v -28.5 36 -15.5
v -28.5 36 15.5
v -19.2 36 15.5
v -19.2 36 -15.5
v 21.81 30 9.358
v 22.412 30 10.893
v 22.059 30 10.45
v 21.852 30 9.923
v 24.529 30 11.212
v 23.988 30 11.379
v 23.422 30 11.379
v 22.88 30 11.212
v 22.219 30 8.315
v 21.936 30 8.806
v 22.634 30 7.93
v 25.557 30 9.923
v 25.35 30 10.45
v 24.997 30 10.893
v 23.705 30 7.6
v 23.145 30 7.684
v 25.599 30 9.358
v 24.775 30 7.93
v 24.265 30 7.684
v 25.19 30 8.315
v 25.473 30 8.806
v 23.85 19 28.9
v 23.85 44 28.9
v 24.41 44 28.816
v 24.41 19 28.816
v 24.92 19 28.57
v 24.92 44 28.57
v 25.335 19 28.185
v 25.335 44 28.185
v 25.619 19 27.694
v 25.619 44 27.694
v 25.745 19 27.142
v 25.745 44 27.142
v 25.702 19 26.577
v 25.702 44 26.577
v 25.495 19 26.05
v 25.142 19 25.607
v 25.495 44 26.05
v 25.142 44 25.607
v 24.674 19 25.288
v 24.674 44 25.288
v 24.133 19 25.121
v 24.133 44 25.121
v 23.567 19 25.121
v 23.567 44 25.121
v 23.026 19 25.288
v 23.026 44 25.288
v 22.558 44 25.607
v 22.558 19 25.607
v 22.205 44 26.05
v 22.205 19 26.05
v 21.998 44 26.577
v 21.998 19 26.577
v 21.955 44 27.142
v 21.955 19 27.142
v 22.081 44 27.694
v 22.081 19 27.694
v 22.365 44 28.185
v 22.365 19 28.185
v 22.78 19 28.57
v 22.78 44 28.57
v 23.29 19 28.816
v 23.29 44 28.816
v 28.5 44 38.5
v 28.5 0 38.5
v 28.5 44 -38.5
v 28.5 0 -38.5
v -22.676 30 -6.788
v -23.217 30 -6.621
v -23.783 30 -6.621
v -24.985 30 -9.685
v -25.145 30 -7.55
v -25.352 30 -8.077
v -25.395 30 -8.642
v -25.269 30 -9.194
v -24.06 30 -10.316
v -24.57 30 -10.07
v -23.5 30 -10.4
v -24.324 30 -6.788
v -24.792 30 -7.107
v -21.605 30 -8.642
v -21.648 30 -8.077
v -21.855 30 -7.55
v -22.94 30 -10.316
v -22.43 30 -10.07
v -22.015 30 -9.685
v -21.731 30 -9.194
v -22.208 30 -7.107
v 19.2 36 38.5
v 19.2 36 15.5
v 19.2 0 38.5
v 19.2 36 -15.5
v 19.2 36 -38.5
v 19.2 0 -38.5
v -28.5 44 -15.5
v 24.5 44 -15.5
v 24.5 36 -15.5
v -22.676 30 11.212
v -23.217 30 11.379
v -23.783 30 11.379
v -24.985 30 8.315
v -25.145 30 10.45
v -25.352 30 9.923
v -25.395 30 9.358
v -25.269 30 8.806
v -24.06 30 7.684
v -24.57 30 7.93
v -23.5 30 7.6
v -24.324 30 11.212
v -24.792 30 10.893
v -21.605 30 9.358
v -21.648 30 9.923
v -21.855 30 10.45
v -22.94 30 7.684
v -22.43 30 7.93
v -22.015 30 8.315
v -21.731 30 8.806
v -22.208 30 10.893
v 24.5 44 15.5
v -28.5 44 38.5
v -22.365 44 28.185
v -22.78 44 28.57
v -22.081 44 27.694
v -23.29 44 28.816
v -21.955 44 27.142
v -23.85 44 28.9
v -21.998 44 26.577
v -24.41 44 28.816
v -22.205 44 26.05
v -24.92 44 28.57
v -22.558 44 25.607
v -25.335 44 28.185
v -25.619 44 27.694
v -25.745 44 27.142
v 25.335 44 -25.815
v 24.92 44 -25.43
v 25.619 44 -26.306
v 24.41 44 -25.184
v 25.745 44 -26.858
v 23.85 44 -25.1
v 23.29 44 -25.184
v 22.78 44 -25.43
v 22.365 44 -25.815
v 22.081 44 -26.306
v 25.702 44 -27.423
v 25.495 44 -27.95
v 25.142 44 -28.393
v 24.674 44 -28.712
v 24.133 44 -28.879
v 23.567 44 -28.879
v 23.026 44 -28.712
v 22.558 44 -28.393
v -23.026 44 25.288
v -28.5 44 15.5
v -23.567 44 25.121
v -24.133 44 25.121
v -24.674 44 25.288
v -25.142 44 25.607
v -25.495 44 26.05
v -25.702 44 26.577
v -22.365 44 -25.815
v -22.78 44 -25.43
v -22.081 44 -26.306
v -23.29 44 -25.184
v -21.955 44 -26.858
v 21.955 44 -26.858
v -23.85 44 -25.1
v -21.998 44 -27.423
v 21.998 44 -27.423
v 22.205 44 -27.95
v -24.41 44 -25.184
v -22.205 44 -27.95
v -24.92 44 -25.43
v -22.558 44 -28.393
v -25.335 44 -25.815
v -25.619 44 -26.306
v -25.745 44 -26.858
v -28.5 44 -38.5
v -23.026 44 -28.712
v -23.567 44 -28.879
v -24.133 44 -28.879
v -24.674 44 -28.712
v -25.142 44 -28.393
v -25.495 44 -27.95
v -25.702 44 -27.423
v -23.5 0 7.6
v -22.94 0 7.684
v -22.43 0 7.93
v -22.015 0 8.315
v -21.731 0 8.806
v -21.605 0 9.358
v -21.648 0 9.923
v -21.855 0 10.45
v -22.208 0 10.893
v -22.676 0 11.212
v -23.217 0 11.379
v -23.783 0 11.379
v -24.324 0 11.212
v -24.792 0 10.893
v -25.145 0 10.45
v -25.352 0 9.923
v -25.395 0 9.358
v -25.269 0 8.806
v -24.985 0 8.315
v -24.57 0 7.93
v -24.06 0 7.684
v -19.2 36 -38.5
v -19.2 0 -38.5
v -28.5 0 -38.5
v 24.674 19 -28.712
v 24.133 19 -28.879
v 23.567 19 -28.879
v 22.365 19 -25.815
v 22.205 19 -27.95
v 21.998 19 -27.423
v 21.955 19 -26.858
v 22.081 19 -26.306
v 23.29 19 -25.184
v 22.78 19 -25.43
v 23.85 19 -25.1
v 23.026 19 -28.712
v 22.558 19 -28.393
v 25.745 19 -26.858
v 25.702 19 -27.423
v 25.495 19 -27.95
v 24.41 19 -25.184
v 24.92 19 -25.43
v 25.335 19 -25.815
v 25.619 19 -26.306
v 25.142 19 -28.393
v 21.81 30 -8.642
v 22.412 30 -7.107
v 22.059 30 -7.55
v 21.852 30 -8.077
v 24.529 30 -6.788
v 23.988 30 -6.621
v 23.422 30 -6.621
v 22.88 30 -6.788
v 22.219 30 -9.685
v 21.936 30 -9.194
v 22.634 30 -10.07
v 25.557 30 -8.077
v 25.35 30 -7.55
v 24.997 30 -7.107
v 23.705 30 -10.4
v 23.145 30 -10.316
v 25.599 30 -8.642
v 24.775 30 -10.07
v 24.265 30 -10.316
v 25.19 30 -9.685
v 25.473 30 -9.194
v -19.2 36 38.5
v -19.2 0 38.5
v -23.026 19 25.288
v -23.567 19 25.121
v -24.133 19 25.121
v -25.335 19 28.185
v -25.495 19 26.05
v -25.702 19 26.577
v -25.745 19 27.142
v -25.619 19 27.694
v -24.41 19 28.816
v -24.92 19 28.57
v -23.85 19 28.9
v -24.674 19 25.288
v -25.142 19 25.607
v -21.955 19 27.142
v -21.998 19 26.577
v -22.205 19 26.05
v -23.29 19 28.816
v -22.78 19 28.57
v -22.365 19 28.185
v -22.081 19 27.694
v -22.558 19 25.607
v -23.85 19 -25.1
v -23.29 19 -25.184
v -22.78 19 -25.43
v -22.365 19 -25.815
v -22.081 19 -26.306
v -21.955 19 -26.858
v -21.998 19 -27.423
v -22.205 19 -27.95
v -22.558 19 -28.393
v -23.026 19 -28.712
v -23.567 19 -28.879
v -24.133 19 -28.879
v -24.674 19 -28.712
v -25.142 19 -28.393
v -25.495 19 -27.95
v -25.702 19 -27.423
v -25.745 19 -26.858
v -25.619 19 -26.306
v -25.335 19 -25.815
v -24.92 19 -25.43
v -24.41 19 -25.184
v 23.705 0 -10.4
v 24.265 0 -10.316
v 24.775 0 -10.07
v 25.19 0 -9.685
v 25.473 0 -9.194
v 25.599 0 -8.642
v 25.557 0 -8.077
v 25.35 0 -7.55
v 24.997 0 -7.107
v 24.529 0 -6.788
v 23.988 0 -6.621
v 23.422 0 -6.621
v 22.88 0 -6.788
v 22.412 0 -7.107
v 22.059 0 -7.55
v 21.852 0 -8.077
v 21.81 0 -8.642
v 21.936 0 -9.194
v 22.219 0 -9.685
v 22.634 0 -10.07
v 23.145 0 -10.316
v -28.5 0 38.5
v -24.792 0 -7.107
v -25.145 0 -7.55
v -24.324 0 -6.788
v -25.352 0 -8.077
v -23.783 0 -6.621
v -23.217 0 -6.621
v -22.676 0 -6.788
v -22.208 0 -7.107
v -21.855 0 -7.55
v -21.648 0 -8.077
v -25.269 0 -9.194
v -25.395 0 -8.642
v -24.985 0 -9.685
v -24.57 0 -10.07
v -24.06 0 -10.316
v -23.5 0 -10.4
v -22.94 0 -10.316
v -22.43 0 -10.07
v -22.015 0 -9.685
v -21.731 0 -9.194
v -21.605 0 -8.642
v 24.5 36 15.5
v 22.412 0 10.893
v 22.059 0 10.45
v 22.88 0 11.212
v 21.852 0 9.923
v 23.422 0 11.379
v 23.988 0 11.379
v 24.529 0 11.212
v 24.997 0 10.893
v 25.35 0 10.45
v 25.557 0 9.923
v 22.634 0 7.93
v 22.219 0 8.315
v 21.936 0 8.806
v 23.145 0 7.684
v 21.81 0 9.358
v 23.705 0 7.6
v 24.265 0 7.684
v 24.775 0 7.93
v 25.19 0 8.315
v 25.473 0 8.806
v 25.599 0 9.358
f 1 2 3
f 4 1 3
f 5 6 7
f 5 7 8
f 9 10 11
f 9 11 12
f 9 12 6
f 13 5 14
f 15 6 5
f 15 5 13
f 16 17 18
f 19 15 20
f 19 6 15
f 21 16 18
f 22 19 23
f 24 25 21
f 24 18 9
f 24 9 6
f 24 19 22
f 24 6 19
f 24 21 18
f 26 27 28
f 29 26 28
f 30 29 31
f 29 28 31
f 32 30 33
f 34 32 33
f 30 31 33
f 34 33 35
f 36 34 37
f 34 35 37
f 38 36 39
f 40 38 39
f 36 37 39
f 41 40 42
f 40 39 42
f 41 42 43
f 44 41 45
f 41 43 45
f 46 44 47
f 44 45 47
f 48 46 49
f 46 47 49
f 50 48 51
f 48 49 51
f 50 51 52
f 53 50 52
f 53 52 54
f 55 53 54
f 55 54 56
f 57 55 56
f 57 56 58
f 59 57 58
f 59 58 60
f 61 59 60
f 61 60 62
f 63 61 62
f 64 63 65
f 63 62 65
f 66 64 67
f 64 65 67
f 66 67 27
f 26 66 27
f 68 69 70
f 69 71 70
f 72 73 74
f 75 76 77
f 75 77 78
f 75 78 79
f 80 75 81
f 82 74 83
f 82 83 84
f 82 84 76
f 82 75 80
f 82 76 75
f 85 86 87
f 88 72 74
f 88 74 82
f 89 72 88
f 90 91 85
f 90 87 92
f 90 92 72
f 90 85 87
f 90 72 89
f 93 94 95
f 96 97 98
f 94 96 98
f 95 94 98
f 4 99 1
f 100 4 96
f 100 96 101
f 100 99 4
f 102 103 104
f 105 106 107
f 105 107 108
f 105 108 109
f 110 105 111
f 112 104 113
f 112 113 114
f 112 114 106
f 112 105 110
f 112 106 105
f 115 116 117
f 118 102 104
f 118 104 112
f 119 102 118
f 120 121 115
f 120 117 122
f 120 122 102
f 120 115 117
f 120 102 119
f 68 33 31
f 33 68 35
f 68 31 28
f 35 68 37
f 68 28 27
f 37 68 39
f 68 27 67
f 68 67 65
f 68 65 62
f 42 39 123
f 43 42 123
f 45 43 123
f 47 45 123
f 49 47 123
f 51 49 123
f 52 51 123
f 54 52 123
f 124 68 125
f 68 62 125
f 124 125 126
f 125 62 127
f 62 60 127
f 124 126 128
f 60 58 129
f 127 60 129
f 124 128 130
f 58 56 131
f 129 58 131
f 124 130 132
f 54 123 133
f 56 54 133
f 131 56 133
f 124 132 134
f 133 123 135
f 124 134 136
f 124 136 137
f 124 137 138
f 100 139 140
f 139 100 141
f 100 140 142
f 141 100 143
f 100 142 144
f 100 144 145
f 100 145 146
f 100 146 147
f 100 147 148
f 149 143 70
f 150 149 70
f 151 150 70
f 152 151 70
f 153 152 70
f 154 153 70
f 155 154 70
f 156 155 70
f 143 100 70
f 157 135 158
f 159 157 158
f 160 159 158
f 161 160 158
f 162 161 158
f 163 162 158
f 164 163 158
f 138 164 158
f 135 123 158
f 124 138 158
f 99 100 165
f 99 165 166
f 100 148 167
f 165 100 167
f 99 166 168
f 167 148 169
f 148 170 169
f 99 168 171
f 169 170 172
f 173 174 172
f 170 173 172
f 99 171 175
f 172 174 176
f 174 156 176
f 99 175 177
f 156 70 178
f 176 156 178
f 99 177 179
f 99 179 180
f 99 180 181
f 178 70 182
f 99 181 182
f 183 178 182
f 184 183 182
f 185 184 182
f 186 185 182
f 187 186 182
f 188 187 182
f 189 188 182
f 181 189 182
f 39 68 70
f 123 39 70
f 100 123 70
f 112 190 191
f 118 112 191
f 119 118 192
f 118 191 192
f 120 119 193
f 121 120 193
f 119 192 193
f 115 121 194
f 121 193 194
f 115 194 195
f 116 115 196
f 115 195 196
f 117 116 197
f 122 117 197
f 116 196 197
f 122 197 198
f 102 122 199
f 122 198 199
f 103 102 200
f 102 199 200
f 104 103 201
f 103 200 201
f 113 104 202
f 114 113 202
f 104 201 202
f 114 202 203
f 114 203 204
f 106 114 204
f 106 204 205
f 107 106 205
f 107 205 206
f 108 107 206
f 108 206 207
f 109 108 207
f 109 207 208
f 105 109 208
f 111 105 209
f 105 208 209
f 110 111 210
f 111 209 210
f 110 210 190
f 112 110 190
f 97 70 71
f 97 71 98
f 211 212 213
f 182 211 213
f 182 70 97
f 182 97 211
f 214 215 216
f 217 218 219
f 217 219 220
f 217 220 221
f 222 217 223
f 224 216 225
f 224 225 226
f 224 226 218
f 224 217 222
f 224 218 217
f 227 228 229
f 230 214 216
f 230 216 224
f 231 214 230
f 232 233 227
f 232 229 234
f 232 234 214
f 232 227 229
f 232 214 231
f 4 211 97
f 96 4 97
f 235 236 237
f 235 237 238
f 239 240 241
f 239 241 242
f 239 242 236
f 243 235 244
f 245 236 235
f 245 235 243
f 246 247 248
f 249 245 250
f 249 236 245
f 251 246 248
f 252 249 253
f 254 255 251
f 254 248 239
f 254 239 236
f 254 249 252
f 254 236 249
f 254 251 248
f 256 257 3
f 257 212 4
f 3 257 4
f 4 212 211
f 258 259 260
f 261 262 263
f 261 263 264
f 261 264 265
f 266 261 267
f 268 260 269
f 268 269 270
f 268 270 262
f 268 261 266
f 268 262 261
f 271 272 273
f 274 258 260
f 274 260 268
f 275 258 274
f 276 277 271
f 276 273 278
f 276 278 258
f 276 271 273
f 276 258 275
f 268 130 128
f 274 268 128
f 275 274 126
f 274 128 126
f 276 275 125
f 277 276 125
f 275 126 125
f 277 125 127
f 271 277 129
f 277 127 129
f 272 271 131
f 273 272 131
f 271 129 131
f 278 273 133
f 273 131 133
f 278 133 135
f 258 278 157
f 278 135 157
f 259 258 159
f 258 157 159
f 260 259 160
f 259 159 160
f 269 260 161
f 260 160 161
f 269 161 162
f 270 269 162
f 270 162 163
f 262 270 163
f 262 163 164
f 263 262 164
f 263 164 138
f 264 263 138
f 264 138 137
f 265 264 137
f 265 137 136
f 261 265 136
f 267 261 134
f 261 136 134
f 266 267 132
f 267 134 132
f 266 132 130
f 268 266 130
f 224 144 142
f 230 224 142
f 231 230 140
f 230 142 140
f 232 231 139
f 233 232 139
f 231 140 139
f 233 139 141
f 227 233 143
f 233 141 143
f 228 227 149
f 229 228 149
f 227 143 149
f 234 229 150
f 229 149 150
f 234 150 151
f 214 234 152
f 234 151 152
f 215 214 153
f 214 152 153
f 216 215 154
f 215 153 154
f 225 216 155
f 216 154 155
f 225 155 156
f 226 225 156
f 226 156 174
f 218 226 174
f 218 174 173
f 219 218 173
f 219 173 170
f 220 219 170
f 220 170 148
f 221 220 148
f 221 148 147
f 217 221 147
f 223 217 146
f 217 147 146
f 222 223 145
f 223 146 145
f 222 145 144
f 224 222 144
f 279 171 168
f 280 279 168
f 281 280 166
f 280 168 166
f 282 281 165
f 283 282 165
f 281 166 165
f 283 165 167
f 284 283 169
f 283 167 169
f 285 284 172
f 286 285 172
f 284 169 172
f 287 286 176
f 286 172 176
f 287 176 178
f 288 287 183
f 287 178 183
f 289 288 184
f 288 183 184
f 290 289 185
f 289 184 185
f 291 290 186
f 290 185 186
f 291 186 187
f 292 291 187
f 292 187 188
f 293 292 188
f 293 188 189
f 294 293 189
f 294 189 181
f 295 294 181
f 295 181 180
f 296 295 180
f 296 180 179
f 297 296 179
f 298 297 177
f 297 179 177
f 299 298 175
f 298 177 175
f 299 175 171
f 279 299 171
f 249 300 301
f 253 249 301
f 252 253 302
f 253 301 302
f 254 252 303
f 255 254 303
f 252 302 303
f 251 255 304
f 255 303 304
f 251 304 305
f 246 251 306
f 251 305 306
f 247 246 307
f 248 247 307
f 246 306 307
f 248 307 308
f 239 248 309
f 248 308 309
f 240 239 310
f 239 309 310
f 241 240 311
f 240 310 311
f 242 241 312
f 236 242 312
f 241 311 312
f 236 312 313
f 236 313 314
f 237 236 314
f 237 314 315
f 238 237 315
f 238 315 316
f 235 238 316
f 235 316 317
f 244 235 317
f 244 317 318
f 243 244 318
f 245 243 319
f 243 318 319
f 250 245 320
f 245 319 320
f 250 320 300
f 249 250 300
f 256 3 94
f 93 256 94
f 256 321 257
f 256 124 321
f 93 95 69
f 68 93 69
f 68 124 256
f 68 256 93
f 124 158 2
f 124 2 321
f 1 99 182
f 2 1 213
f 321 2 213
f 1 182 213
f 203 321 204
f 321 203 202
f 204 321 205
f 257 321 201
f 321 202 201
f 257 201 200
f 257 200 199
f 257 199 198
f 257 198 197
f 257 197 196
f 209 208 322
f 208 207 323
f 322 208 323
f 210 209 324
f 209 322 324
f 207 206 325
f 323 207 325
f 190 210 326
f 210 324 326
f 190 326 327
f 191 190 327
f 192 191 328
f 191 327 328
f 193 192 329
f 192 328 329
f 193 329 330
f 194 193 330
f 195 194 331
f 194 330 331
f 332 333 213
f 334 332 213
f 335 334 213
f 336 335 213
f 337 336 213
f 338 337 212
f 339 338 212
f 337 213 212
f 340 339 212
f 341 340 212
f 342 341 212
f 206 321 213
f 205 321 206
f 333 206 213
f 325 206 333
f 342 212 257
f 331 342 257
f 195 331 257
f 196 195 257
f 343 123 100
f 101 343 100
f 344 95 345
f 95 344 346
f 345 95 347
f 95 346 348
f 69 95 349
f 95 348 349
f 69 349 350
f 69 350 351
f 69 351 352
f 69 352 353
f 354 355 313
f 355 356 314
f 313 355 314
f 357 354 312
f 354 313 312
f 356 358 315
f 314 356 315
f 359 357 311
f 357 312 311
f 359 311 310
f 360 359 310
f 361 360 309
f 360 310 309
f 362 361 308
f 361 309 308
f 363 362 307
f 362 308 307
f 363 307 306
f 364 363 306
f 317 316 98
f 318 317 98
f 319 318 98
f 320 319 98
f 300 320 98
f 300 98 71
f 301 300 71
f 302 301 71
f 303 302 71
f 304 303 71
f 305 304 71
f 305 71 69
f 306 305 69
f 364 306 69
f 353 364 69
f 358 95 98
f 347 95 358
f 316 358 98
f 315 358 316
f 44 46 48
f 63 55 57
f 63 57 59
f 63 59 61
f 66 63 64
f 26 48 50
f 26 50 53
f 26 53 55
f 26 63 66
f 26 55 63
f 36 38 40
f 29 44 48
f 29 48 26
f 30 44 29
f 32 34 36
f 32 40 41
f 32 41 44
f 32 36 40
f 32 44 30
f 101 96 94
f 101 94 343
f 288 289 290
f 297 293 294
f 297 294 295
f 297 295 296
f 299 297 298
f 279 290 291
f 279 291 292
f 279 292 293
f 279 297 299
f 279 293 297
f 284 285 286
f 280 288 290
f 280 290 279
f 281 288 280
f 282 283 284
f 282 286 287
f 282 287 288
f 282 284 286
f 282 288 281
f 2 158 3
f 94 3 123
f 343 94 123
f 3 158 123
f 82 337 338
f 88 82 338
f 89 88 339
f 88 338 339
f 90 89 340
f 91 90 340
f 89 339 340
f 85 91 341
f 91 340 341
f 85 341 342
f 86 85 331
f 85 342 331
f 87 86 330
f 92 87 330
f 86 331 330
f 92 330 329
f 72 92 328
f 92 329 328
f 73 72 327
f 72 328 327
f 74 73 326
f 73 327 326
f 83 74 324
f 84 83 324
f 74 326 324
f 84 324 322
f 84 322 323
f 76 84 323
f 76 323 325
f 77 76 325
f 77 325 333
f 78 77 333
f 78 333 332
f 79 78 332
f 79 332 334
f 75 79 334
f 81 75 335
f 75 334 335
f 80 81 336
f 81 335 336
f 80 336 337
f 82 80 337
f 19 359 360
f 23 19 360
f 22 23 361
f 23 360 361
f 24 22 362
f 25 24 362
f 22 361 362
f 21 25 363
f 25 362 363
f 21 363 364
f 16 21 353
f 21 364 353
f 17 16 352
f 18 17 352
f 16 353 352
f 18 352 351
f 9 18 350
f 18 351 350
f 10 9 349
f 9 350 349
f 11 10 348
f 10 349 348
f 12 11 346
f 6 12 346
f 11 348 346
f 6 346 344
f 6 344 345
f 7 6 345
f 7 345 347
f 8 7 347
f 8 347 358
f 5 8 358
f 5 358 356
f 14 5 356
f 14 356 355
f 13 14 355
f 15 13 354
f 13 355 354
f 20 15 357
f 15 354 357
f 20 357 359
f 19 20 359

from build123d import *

# Parameters (mm, degrees)
SKETCH1_W           = 57
SKETCH1_H           = 37
BOSS_EXTRUDE1_DEPTH = 44
SKETCH2_W           = 38.4
SKETCH2_H           = 36
CUT_EXTRUDE1_DEPTH  = 47
SKETCH4_R           = 1.9
CUT_EXTRUDE3_DEPTH  = 30
BOSS_EXTRUDE2_DEPTH = 20
BOSS_EXTRUDE3_DEPTH = 20
SKETCH7_W           = 53
SKETCH7_H           = 31
CUT_EXTRUDE4_DEPTH  = 8
SKETCH8_R           = 1.9
CUT_EXTRUDE5_DEPTH  = 25


with BuildPart() as part:
    # Sketch1 → Boss-Extrude1 (new body)
    with BuildSketch(Plane(origin=(0, 0, 0), x_dir=(1, 0, 0), z_dir=(0, 1, 0))):
        Rectangle(SKETCH1_W, SKETCH1_H)
    extrude(amount=BOSS_EXTRUDE1_DEPTH)

    # Sketch2 → Cut-Extrude1 (cut)
    with BuildSketch(Plane.XY.offset(18.5)):
        with Locations((0, 18)):
            Rectangle(SKETCH2_W, SKETCH2_H)
    extrude(amount=-CUT_EXTRUDE1_DEPTH, mode=Mode.SUBTRACT)

    # Sketch4 → Cut-Extrude3 (cut)
    with BuildSketch(Plane.XZ):
        with Locations((23.704806449, 9.5)):
            Circle(SKETCH4_R)
        with Locations((23.704806449, -8.5)):
            Circle(SKETCH4_R)
        with Locations((-23.5, 9.5)):
            Circle(SKETCH4_R)
        with Locations((-23.5, -8.5)):
            Circle(SKETCH4_R)
    extrude(amount=-CUT_EXTRUDE3_DEPTH, mode=Mode.SUBTRACT)

    # Sketch5 → Boss-Extrude2 (add)
    with BuildSketch(Plane(origin=(0, 0, -18.5), x_dir=(-1, 0, 0), z_dir=(0, 0, -1))):
        Polygon((-19.2, 36), (19.2, 36), (19.2, 0), (28.5, 0), (28.5, 44), (-28.5, 44), (-28.5, 0), (-19.2, 0), align=None)
    extrude(amount=BOSS_EXTRUDE2_DEPTH)

    # Sketch6 → Boss-Extrude3 (add)
    with BuildSketch(Plane.XY.offset(18.5)):
        Polygon((-28.5, 0), (-19.2, 0), (-19.2, 36), (19.2, 36), (19.2, 0), (28.5, 0), (28.5, 44), (-28.5, 44), align=None)
    extrude(amount=BOSS_EXTRUDE3_DEPTH)

    # Sketch7 → Cut-Extrude4 (cut)
    with BuildSketch(Plane(origin=(0, 44, 0), x_dir=(1, 0, 0), z_dir=(0, 1, 0))):
        with Locations((-2, 0)):
            Rectangle(SKETCH7_W, SKETCH7_H)
    extrude(amount=-CUT_EXTRUDE4_DEPTH, mode=Mode.SUBTRACT)

    # Sketch8 → Cut-Extrude5 (cut)
    with BuildSketch(Plane(origin=(0, 44, 0), x_dir=(1, 0, 0), z_dir=(0, 1, 0))):
        with Locations((-23.85, 27)):
            Circle(SKETCH8_R)
        with Locations((23.85, 27)):
            Circle(SKETCH8_R)
        with Locations((-23.85, -27)):
            Circle(SKETCH8_R)
        with Locations((23.85, -27)):
            Circle(SKETCH8_R)
    extrude(amount=-CUT_EXTRUDE5_DEPTH, mode=Mode.SUBTRACT)


solid = part.part
